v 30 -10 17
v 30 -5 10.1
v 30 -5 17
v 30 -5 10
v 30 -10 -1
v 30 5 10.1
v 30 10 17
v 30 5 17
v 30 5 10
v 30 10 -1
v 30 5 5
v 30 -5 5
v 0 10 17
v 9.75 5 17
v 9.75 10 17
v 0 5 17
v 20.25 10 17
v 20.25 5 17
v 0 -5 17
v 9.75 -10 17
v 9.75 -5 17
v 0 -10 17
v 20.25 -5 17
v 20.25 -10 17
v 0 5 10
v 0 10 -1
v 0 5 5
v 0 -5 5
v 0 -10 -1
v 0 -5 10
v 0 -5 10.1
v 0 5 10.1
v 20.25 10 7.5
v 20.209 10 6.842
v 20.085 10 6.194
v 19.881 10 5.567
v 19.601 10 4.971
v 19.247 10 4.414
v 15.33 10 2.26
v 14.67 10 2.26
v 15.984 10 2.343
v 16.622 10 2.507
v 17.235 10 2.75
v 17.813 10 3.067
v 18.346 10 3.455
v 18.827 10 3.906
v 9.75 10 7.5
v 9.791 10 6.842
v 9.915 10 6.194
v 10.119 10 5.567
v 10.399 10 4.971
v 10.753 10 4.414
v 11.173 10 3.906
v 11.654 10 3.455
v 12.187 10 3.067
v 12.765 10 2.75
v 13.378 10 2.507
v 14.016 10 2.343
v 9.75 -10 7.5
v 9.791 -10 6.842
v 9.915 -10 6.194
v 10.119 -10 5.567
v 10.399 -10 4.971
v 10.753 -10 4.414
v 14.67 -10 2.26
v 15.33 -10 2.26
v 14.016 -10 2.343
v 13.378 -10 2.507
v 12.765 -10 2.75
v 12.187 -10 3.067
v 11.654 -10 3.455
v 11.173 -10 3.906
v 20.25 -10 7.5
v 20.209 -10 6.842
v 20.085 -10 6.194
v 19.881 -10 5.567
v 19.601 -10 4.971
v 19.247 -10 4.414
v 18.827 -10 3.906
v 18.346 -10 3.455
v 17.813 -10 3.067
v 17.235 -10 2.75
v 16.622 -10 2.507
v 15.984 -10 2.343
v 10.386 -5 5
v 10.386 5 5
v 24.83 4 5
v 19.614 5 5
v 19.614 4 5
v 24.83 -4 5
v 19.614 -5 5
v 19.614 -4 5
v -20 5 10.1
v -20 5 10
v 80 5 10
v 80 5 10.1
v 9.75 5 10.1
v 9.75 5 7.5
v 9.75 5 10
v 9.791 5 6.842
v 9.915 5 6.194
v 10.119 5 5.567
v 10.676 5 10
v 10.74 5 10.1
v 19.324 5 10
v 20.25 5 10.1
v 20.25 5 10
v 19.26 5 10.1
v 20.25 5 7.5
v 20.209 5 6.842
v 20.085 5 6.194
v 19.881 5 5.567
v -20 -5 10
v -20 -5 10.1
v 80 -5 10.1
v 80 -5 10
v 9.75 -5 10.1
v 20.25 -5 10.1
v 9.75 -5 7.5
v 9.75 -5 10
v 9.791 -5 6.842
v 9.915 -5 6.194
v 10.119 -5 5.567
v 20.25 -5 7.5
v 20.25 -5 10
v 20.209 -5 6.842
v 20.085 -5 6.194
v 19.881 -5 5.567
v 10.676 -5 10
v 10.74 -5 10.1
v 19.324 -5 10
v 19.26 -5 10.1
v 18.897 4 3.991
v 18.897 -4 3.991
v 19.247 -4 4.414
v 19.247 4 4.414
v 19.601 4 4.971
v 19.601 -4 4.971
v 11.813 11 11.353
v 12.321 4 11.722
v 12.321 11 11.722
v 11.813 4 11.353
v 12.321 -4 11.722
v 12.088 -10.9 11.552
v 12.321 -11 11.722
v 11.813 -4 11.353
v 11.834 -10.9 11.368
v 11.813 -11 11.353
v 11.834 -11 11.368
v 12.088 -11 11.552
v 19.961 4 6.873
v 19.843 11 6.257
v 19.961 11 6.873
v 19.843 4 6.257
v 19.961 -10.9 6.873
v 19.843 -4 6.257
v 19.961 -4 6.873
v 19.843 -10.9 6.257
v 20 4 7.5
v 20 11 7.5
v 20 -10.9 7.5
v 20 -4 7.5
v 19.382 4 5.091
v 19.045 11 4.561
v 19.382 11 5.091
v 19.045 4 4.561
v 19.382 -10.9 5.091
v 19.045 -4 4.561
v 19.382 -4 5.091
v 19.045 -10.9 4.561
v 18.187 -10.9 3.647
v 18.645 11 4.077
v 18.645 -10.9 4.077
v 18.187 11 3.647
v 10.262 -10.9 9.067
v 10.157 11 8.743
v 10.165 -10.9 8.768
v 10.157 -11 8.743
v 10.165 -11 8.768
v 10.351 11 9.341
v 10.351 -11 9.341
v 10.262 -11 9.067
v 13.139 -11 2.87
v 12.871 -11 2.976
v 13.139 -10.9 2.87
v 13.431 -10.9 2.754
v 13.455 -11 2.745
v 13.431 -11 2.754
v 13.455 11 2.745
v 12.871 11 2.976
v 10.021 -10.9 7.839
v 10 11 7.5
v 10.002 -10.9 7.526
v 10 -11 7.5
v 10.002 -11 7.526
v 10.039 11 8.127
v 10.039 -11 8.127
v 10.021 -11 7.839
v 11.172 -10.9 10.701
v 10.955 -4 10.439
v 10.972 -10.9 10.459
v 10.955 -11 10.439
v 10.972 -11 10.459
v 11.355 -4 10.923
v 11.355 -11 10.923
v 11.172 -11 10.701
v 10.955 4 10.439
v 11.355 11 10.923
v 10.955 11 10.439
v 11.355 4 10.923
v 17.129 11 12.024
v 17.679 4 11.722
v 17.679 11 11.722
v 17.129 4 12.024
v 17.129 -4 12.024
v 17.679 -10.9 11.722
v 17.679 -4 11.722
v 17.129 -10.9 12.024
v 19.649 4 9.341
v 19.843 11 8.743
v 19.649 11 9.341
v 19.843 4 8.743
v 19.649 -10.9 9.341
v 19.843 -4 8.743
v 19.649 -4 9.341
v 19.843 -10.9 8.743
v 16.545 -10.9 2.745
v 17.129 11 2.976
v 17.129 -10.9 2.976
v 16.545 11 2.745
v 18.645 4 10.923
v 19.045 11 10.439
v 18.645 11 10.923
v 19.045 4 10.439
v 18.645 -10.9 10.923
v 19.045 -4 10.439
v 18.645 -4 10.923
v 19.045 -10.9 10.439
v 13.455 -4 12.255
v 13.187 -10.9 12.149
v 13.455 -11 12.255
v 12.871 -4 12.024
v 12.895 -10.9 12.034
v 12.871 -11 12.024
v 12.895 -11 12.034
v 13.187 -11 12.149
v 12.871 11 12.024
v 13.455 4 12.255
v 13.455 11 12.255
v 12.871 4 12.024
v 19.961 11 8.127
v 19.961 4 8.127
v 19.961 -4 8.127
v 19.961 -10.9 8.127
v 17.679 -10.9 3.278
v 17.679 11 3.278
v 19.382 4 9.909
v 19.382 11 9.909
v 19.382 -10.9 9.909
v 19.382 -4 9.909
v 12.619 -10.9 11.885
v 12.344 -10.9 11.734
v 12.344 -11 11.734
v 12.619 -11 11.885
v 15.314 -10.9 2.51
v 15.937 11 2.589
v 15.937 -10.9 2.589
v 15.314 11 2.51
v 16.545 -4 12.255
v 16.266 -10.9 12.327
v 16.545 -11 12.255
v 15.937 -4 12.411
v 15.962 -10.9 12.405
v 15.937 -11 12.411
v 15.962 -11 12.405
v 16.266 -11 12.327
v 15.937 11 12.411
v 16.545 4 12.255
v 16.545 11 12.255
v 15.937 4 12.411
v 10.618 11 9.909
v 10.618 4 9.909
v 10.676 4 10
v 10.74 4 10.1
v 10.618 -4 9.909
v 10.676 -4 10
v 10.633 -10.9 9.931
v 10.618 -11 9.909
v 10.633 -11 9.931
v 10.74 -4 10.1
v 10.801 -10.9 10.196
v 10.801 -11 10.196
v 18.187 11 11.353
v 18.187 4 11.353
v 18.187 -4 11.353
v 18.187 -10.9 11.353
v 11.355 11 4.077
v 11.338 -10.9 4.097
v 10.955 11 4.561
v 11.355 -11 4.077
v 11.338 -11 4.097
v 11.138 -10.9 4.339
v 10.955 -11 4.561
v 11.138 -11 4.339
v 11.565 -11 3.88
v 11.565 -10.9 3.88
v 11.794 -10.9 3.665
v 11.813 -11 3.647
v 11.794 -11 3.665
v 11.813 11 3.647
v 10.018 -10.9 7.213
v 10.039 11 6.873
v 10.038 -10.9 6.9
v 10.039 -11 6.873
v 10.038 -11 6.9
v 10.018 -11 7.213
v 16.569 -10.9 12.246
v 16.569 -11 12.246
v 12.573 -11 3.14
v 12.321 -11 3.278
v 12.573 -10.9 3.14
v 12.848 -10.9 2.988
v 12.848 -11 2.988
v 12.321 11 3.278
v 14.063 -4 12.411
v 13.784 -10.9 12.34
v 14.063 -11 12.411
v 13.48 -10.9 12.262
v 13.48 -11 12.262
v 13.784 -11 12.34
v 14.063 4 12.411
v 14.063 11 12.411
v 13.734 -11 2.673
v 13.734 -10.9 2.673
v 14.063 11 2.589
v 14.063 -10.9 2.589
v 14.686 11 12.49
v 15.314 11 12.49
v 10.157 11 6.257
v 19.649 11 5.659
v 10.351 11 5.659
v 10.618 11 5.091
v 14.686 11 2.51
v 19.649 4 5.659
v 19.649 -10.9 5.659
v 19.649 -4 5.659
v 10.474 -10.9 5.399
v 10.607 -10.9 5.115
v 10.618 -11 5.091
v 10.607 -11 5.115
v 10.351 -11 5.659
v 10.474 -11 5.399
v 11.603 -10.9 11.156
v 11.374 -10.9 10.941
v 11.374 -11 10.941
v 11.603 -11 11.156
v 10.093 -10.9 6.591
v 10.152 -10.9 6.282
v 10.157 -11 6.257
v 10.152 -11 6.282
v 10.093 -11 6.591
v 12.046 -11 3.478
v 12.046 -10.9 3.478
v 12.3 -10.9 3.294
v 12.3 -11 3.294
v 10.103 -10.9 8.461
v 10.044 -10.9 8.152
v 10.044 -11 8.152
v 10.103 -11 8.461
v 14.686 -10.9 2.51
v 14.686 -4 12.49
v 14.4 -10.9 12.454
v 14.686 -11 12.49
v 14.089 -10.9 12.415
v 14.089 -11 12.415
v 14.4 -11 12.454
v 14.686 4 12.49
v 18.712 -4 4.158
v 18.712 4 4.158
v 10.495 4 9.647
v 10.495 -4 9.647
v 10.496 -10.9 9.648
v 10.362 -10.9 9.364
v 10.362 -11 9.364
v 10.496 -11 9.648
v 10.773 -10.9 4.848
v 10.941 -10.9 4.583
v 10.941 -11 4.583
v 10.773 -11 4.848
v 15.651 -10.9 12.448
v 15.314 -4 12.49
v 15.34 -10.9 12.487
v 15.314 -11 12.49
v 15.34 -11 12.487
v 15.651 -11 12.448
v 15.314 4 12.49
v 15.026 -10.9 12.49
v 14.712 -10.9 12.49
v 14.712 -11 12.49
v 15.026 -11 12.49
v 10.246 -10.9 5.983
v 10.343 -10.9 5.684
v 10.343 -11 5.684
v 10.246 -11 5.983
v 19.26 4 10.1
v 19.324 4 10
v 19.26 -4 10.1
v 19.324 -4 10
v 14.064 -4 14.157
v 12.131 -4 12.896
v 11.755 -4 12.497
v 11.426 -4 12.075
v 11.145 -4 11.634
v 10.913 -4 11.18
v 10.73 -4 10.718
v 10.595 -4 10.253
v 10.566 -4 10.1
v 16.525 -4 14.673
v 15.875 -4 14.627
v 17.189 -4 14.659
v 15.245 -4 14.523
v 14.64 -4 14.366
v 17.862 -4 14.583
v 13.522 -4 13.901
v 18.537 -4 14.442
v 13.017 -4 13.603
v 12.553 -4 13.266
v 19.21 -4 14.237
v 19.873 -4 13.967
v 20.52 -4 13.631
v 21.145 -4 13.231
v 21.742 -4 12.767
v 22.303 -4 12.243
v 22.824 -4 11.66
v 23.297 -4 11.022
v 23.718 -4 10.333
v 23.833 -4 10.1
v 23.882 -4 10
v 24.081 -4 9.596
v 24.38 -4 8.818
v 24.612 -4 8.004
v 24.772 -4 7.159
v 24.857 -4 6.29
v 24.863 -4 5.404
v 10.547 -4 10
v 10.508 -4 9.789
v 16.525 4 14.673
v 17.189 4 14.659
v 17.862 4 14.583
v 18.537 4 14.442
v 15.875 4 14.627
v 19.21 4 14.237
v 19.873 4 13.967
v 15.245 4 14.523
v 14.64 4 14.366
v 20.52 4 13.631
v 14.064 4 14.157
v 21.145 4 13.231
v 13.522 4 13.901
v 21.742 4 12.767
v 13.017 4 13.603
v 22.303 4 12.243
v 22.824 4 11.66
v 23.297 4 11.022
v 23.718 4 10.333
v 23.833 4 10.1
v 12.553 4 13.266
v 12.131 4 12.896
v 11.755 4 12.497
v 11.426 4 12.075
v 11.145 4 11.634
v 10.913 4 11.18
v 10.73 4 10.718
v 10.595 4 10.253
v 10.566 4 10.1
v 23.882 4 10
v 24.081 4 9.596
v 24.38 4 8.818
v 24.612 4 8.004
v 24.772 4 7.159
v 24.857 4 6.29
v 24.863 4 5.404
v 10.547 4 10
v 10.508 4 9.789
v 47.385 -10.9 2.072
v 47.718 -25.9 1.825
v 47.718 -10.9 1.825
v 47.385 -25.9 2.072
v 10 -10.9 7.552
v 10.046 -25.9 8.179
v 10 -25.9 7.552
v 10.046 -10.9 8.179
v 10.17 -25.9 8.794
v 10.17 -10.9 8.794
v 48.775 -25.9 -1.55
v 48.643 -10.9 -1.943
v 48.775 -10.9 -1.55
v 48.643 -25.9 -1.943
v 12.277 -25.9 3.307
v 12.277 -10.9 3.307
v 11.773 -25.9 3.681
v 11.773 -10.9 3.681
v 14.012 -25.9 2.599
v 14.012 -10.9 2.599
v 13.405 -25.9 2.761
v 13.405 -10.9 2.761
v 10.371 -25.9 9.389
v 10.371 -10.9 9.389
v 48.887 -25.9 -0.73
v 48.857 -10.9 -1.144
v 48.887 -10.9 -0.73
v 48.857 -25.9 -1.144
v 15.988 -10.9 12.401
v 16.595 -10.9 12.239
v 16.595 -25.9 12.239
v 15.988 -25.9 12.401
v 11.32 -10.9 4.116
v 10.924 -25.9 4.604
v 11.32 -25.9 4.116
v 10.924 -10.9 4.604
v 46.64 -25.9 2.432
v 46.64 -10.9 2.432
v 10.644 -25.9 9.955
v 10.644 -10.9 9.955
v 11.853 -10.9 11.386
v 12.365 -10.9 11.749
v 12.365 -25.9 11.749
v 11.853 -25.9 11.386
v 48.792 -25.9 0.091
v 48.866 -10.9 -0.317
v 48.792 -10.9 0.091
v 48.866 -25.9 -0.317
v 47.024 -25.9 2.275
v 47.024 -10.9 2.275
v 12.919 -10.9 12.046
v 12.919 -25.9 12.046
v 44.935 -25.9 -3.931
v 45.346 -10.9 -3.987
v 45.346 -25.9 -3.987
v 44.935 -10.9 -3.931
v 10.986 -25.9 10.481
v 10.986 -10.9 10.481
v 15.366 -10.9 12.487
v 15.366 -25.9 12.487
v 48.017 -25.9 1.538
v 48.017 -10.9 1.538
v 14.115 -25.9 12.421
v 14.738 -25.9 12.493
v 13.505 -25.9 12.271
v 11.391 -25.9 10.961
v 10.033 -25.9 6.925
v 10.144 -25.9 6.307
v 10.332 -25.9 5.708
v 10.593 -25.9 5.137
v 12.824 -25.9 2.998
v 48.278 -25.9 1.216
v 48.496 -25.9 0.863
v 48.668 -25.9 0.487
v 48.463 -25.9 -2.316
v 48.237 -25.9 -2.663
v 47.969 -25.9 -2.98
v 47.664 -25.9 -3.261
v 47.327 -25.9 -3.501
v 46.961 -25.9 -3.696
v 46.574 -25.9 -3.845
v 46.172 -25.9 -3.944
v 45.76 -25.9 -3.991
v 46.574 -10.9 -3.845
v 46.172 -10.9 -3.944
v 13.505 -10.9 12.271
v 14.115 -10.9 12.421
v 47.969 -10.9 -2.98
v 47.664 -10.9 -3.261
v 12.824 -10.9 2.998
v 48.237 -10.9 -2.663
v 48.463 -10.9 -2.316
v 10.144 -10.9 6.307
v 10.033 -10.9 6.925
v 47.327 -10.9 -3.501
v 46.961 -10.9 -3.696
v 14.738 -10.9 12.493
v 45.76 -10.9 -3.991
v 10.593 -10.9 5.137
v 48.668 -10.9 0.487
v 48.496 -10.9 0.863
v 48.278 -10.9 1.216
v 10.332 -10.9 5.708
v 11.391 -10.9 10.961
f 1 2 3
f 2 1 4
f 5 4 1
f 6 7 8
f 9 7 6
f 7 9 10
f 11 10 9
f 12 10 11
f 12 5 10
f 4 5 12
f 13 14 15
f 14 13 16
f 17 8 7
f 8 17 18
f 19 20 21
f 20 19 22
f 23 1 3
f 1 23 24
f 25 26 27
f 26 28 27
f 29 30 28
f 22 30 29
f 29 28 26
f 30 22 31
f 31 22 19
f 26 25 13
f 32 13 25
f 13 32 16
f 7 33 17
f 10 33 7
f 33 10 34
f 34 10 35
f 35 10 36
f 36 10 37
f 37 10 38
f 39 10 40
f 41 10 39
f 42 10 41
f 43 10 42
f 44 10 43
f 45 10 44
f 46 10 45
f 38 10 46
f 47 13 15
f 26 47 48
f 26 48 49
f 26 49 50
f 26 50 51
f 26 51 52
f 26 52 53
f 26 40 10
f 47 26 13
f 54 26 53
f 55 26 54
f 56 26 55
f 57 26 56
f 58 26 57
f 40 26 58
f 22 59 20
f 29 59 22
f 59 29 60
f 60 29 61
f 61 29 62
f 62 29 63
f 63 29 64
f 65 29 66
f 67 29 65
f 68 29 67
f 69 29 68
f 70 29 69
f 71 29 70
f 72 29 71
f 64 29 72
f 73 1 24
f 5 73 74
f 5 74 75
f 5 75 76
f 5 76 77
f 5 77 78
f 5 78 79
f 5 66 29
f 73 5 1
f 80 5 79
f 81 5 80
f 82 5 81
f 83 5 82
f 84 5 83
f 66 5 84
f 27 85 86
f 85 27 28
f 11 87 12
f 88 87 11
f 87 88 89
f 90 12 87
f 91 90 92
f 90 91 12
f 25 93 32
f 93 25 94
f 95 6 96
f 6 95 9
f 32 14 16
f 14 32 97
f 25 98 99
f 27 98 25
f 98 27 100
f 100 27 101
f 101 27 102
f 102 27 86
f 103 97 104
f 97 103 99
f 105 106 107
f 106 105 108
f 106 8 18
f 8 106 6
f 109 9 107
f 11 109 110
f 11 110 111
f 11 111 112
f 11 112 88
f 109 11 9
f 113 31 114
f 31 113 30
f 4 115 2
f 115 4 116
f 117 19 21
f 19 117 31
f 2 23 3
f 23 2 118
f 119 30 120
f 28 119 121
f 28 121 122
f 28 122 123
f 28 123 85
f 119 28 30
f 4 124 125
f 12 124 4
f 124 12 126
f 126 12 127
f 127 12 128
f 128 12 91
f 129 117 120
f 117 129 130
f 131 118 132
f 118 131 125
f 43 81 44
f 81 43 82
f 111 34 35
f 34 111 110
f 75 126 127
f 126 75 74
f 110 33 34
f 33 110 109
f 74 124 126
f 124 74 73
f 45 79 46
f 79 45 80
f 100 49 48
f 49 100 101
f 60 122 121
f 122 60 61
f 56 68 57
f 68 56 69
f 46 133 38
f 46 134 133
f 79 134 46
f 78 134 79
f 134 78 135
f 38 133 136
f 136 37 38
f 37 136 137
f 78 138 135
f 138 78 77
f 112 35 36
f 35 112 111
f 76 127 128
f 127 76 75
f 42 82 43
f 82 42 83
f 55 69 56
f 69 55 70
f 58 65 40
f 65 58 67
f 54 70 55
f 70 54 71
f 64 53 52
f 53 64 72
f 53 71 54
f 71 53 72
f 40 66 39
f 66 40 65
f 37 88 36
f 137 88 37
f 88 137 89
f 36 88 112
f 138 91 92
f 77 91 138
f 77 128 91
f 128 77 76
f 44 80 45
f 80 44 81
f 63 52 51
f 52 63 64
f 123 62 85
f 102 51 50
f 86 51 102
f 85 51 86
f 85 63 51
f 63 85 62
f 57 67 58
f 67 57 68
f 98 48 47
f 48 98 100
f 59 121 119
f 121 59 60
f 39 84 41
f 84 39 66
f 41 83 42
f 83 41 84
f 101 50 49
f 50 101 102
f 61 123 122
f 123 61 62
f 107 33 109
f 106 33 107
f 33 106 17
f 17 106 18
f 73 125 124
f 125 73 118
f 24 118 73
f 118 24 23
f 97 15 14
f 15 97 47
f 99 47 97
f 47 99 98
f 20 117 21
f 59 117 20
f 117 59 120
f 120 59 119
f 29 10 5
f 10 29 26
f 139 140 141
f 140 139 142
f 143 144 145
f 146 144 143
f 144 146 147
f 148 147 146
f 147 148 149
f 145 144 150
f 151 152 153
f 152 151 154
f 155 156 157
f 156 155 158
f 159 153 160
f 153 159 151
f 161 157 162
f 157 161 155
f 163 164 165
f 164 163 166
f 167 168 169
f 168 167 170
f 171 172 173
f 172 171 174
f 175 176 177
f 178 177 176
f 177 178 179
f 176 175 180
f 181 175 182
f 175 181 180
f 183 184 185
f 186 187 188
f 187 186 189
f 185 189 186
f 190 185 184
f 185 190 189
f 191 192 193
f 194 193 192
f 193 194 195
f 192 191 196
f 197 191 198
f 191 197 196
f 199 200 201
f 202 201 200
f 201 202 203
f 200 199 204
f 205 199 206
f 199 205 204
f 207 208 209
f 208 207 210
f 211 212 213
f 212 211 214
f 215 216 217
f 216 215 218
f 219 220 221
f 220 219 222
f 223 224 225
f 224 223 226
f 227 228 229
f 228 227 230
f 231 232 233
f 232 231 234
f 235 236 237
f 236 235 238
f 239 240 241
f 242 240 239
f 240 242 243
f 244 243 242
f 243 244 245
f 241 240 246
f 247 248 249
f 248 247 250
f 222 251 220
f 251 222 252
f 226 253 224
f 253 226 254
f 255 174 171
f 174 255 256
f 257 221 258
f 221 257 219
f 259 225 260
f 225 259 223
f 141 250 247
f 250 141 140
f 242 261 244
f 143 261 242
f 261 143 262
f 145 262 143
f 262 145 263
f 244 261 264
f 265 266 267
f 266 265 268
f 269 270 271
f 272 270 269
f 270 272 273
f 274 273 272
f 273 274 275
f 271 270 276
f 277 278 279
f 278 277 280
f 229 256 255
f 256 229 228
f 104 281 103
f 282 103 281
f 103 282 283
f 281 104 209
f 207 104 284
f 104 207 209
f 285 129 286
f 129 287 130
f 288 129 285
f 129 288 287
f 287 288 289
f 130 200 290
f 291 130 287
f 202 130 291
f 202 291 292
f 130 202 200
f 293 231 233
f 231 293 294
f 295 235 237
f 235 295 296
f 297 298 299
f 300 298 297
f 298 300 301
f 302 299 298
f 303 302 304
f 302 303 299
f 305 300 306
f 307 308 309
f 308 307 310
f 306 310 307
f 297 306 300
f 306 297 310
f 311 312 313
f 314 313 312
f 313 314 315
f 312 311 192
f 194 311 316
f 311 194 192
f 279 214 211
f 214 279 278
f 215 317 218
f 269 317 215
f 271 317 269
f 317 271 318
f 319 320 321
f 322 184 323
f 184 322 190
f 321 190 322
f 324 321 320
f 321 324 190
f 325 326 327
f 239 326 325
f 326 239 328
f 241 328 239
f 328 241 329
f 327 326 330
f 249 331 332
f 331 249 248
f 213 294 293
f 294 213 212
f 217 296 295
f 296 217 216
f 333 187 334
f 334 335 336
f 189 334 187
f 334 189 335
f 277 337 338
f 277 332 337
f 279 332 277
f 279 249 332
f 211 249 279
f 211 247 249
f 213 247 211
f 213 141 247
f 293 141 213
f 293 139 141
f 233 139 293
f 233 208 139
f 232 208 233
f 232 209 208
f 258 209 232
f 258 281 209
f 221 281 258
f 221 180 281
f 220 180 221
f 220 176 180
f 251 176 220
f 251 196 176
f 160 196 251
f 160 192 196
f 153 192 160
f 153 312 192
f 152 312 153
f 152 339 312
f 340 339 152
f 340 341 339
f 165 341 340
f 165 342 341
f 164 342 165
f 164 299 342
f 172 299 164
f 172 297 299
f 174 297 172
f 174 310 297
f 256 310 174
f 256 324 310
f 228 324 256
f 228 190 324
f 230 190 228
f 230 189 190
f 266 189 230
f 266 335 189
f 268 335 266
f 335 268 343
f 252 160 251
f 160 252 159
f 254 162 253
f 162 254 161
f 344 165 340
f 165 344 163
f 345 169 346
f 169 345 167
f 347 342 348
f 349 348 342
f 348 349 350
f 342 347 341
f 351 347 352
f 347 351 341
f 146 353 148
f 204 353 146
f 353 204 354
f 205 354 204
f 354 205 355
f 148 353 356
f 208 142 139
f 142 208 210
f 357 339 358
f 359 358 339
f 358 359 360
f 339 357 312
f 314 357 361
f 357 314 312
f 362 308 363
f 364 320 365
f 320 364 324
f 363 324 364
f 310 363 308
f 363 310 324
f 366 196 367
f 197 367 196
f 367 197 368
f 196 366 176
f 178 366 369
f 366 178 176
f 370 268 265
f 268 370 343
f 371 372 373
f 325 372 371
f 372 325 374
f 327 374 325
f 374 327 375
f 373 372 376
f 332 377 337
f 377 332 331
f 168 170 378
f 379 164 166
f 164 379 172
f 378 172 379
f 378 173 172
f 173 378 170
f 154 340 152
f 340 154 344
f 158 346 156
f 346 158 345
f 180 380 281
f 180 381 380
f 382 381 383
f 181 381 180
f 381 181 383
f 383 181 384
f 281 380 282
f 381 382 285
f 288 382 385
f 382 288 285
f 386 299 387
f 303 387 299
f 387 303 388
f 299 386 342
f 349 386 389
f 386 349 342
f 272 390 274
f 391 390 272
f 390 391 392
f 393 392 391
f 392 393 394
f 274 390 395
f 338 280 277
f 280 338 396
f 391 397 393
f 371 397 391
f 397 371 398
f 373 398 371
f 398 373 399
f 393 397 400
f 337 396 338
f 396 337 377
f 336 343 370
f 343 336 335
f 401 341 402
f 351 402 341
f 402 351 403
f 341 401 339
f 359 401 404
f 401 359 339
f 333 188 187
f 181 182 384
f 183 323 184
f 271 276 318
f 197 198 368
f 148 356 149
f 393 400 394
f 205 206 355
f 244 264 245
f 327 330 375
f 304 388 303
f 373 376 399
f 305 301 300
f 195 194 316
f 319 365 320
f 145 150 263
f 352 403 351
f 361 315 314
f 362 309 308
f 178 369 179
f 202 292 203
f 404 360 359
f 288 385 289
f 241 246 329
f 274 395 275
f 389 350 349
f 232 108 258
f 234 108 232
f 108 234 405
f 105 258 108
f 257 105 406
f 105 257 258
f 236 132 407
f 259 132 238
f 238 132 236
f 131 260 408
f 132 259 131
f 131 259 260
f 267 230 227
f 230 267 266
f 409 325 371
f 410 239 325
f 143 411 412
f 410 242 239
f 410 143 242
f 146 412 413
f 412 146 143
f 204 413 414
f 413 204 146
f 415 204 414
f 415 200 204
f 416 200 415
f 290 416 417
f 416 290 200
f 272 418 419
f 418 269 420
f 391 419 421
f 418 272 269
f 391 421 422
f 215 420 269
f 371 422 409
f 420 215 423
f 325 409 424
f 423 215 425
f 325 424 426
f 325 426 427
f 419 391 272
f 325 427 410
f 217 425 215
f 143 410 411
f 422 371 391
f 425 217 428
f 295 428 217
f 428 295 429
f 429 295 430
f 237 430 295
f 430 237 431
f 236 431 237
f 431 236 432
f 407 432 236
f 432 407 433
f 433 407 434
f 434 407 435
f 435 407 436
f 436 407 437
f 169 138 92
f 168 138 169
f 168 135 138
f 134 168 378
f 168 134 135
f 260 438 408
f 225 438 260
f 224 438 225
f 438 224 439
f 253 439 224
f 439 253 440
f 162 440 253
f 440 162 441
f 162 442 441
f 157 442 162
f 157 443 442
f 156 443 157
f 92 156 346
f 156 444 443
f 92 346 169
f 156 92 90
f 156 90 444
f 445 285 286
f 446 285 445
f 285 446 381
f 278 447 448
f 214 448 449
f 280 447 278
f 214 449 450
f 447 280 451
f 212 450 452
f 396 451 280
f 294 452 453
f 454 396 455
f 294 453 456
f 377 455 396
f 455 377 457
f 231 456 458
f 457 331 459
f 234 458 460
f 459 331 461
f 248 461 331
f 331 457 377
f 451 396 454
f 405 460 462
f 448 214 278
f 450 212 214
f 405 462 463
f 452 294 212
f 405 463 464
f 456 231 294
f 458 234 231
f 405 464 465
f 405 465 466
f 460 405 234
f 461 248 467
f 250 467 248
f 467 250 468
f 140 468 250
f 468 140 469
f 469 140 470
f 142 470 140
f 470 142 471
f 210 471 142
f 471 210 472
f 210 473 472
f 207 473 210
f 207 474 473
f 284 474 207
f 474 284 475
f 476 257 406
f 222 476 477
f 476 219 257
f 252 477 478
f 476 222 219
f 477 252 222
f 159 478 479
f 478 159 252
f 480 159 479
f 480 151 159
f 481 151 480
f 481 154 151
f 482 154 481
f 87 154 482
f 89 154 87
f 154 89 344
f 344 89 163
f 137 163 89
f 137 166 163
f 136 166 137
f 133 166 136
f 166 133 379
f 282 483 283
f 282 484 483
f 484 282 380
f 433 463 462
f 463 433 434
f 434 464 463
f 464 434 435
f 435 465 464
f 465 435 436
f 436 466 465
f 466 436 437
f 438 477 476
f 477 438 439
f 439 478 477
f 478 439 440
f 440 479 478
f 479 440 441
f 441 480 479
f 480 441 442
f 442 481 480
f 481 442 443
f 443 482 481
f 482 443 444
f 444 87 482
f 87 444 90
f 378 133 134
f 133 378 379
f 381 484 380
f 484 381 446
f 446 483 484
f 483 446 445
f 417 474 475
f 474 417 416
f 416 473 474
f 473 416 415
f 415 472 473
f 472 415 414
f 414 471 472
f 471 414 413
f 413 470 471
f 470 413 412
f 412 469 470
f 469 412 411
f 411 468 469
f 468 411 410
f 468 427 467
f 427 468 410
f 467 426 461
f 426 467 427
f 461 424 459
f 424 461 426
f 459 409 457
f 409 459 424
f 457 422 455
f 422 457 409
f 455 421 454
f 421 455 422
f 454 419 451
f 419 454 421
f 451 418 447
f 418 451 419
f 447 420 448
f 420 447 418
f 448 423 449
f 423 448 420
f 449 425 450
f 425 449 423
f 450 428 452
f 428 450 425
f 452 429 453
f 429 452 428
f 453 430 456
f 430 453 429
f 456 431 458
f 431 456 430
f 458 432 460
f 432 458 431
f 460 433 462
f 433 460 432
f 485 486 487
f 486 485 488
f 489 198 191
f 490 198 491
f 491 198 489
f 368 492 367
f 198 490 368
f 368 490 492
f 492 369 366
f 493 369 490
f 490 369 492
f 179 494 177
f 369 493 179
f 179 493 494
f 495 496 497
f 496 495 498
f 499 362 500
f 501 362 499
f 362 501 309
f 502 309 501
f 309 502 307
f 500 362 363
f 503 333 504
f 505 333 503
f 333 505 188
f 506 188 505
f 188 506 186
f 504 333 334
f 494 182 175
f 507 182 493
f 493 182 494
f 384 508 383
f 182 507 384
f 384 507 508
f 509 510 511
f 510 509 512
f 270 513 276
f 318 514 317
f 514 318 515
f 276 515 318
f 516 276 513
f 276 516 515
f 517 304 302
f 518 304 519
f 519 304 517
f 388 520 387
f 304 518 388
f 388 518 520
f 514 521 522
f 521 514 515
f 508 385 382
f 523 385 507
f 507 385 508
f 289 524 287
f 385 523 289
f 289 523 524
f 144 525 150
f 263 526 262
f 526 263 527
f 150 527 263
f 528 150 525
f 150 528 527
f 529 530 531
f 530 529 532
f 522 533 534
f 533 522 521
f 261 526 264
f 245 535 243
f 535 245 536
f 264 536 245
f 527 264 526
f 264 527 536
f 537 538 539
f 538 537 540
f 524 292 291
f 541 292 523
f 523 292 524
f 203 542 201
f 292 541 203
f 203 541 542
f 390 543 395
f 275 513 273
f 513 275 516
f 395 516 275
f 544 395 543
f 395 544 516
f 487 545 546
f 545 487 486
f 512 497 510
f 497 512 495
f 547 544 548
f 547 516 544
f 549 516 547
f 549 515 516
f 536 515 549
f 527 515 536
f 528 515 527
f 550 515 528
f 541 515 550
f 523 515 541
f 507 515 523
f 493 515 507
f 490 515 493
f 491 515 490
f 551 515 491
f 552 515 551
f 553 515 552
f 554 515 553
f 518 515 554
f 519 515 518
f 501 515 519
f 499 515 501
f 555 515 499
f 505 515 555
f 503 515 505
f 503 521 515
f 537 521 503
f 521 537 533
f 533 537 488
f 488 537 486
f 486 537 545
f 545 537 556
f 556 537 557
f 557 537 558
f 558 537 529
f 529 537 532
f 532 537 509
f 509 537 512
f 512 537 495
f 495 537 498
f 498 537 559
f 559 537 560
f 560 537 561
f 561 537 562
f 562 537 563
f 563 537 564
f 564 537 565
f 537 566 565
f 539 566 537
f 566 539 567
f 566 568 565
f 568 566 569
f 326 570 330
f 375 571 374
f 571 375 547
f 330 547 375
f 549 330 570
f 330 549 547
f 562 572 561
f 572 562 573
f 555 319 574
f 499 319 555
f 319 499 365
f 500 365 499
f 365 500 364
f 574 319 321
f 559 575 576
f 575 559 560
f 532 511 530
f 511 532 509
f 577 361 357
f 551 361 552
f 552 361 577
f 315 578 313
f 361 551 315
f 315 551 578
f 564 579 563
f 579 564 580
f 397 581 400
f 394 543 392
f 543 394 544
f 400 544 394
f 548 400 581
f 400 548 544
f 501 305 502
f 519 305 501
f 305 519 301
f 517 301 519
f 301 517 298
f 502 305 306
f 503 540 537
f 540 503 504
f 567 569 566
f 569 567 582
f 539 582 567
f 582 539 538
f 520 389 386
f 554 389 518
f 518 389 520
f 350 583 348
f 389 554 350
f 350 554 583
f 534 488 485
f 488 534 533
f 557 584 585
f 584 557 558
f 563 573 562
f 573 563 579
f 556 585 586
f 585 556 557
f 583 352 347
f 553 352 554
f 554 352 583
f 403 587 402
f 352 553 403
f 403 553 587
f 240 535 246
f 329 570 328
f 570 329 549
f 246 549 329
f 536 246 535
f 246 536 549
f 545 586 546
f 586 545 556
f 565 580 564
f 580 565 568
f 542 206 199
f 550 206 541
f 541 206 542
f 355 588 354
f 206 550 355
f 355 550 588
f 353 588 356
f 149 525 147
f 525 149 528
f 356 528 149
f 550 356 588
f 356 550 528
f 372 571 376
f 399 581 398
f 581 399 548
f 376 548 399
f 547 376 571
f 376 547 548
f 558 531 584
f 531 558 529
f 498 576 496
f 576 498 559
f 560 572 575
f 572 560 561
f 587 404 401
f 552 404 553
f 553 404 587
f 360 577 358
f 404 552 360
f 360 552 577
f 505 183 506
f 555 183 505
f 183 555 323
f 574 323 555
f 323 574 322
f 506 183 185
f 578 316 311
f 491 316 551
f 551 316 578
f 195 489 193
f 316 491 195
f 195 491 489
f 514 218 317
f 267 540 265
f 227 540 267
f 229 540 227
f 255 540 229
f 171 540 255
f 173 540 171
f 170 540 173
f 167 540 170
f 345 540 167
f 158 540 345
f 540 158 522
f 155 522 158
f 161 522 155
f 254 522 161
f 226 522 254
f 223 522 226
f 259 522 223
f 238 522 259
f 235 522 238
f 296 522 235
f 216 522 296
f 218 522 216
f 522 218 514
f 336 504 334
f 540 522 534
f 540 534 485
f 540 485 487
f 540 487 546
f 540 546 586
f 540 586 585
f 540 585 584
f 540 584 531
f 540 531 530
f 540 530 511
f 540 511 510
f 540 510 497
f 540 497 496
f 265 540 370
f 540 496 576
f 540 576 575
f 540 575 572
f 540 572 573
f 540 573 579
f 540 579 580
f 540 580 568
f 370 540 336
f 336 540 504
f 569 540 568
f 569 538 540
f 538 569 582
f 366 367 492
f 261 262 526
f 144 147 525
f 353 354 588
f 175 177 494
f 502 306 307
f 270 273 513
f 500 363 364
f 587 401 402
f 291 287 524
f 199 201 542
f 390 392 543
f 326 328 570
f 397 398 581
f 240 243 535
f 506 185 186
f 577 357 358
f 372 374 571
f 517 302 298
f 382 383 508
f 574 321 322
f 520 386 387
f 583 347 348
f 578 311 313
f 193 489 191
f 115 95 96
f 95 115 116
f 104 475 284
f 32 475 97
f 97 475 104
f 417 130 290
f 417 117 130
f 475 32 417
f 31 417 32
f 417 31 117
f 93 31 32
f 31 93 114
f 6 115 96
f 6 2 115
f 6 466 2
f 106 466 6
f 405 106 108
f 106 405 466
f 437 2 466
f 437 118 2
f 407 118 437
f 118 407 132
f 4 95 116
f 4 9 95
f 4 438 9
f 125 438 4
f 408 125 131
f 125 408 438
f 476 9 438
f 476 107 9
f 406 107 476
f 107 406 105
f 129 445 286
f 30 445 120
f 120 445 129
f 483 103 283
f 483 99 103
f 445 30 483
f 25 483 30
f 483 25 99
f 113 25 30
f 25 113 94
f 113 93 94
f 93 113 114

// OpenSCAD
// a window stopper with rotating wedge
// (all sizes in millimeter)

module window_stopper(

    /* parameters */
    
    // for window
    window_thickness = 10,   // thickness of window frame
    windowsill_dist = 10,        // distance between window and windowsill
    // for window_stopper
    windowsill_adj = 1,     // adjustment for windowsill distance
    stopper_width = 30,     // width of the stopper
    material_thickness = 5,     // material thickness of the stopper
    window_overlap = 7,     // overlap of stopper and window
    axle_dm = 10,       // axle diameter
    axle_clearance = 0.5,       // axle clearance towards bushing
    // for stopper
    wedge_start_r = 0,      // wedge start radius
    wedge_end_r = 11,      // wedge end radius
    wedge_angle = 42,       // start angle of wedge
    lever_depth = 15,       // depth of lever
    lever_length = 40,      // length of lever
    lever_angle = 15,       // start angle of lever
    
) {
    
    $fn = 50;
    
    axle_height =
        material_thickness + (windowsill_dist - material_thickness) / 2;
    
    module window() {
        color("LightSkyBlue")
            translate( [ -20, -window_thickness / 2, windowsill_dist])
                cube( [100, window_thickness, 0.1]);
        }
    
    module stopper_case() {
        case_size = [
            stopper_width,
            window_thickness + material_thickness * 2,
            windowsill_dist + window_overlap
        ];
        
        translate( [0, -case_size.y / 2, 0] )
        difference() {
            cube( case_size );
            axle_bushing = axle_dm + axle_clearance;
            
            translate( [-1, material_thickness, material_thickness] )
                cube( [case_size.x + 2, window_thickness, case_size.z] );
            
            translate( [case_size.x / 2, -1, axle_height] )
                rotate( [-90,0.0])
                    cylinder( d = axle_bushing, h = case_size.y + 2);
            
            translate( [(case_size.x - axle_bushing) / 2, -1, axle_height] )
                cube( [axle_bushing, case_size.y + 2, case_size.z] );
        }
        
        translate( [0, -case_size.y / 2, -windowsill_adj] )
            cube( [case_size.x, case_size.y, windowsill_adj] );
        
        }
    
    module stopper( angle = 0 ) {
        axle_length = window_thickness + material_thickness * 2 + 2;
        
        translate( [stopper_width / 2, -axle_length / 2, axle_height] )
            rotate( [ -90, 0, 0] )
                cylinder( d = axle_dm, h = axle_length );
        
        points = [
            for ( i = [0:5:360] )
                let ( radius = wedge_start_r + (wedge_end_r - wedge_start_r) * i / 360 )
            [ cos(i) * radius, sin(i) * radius ]
        ];
        
//        points = [
//            for ( i = [0:5:360] )
//            [ cos(i) * (wedge_start_r + (wedge_end_r - wedge_start_r) * i / 360), sin(i) * (wedge_start_r + (wedge_end_r - wedge_start_r) * i / 360) ]
//        ];
            
        wedge_width = window_thickness - 2;
            
//            echo(points);
       translate( [stopper_width / 2, -wedge_width / 2, axle_height] )
            rotate( [-90, 0, 0] )
            rotate( [0, 0, wedge_angle + angle] )
            linear_extrude( height = wedge_width )
            polygon(points);
            
        translate( [stopper_width / 2, -axle_length / 2 + 0.1, axle_height] )
            rotate( [0, lever_angle + angle, 0] )
            rotate( [90,0,0])
            linear_extrude( height = lever_depth )
            hull() {
            circle ( d = axle_dm );
            translate( [lever_length - axle_dm / 2 - axle_dm / 3, 0, 0] )
               circle( d = axle_dm * 0.66);
        }
            
        }
    
    window();
    stopper_case();
    stopper( 0 );
    
}

window_stopper( /* parameters */ );
